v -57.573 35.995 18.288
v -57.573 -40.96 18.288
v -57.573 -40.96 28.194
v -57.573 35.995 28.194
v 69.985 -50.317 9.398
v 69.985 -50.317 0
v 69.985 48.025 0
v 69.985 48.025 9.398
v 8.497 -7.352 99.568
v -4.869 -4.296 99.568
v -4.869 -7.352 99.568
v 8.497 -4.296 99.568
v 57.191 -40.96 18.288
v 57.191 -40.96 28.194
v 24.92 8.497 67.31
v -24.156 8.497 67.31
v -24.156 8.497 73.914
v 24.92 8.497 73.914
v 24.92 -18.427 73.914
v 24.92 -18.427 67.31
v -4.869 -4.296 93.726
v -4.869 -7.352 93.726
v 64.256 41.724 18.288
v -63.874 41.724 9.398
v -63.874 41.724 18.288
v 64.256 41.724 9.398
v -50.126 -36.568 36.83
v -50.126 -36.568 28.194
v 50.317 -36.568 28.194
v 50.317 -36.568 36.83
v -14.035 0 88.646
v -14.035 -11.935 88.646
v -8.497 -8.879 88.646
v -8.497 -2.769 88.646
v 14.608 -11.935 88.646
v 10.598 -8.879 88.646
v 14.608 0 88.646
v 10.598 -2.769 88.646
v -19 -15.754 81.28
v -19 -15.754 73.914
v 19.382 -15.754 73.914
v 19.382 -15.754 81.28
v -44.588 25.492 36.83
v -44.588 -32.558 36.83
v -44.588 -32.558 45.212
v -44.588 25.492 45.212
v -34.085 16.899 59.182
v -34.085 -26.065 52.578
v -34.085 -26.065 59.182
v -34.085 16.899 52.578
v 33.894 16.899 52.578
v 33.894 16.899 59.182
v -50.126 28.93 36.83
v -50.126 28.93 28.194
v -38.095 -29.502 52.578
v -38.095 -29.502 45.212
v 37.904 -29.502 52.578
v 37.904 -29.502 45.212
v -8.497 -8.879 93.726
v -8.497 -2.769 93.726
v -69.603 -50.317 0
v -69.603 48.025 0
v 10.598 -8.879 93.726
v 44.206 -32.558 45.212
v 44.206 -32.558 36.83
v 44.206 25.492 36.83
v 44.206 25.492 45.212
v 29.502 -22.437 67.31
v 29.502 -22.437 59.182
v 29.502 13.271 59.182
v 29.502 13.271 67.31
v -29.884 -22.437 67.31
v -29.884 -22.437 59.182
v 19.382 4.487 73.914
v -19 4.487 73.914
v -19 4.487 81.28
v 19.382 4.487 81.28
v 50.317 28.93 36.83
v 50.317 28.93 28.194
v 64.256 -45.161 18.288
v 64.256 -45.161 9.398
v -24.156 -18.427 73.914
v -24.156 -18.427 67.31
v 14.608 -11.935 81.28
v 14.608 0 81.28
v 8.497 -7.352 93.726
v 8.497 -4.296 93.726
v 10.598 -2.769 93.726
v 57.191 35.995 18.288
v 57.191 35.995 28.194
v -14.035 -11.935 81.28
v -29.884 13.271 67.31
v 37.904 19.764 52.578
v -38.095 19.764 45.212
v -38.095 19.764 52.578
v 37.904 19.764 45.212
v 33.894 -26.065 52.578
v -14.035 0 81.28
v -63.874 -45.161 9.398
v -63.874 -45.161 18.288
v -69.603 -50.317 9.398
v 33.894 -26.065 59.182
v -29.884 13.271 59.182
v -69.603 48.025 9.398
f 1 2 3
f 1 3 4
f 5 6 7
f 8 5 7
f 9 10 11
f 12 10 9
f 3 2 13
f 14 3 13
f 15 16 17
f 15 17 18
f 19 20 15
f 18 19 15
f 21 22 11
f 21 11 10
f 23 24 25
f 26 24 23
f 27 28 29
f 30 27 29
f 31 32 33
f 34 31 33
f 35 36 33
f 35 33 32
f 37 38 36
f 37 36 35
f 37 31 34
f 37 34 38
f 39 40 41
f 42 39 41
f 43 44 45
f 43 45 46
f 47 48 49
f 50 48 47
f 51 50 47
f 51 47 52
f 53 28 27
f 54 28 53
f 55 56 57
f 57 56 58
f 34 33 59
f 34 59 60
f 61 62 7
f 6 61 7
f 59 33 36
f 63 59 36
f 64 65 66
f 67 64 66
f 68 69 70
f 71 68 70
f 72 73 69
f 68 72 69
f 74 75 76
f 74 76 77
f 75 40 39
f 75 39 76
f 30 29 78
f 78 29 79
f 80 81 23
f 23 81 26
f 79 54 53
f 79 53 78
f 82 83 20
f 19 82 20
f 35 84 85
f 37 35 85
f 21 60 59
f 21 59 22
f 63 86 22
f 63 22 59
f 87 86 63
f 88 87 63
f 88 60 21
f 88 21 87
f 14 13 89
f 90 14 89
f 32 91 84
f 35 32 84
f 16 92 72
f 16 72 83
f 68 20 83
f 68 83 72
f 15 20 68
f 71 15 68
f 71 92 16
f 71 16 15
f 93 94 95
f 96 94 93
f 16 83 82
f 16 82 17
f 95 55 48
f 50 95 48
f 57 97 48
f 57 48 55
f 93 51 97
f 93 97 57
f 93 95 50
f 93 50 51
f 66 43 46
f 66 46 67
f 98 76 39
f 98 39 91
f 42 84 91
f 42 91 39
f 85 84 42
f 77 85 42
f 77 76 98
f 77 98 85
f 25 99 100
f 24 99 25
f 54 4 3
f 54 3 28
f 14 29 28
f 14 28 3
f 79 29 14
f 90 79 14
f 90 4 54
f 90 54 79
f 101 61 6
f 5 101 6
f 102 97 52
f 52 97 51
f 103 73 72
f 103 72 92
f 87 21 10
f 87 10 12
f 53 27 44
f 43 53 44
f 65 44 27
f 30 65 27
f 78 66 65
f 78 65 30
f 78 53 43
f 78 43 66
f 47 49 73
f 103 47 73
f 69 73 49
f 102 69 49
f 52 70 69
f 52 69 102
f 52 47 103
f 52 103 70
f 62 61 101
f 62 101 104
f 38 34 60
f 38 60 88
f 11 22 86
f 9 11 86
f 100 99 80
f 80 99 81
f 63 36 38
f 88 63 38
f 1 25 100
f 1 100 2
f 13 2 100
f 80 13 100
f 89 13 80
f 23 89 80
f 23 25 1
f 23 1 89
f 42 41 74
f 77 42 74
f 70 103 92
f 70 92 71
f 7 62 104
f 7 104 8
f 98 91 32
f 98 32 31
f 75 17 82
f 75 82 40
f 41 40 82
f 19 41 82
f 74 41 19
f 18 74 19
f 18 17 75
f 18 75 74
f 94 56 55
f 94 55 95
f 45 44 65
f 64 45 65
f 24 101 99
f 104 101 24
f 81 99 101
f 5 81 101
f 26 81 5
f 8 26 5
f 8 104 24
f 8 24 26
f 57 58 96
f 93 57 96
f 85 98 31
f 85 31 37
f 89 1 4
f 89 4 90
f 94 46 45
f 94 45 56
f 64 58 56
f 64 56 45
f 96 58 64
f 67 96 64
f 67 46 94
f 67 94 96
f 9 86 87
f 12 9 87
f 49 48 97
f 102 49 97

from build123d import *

# Parameters (mm, degrees)
F0_W      = 13.366825413
F0_H      = 3.0552744865
F1_DEPTH  = 99.568
F0_W_2    = 19.0954655409
F0_H_2    = 6.1105492059
F2_DEPTH  = 93.726
F0_W_3    = 28.6431992427
F0_H_3    = 11.9346659631
F3_DEPTH  = 88.646
F0_W_4    = 38.3818857372
F0_H_4    = 20.2411934733
F4_DEPTH  = 81.28
F0_W_5    = 49.0753464401
F0_H_5    = 26.9246064126
F5_DEPTH  = 73.914
F0_W_6    = 59.3868978322
F0_H_6    = 35.7085214928
F6_DEPTH  = 67.31
F0_W_7    = 67.9798536003
F0_H_7    = 42.964797467
F7_DEPTH  = 59.182
F0_W_8    = 75.9999491274
F0_H_8    = 49.2663010955
F8_DEPTH  = 52.578
F0_W_9    = 88.7939184904
F0_H_9    = 58.0502152443
F9_DEPTH  = 45.212
F0_W_10   = 100.4421524704
F0_H_10   = 65.4974486679
F10_DEPTH = 36.83
F0_W_11   = 114.7637441754
F0_H_11   = 76.9547224045
F11_DEPTH = 28.194
F0_W_12   = 128.1305700541
F0_H_12   = 86.884368211
F12_DEPTH = 18.288
F0_W_13   = 139.5878568292
F0_H_13   = 98.3416512609
F13_DEPTH = 9.398


# Not quite as in the source:
# - the program builds the solid bodies; features that only make, move or delete a surface that nothing else refers to are left out


with BuildPart() as f1:
    # F0 (on Top) → F1 (new body)
    with BuildSketch(Plane.XY):
        with Locations((1.8140685279, -5.8241172228)):
            Rectangle(F0_W, F0_H)
    extrude(amount=F1_DEPTH)

    # F0 (on Top) → F2 (join)
    with BuildSketch(Plane.XY):
        with Locations((1.0502506047, -5.8241168736)):
            Rectangle(F0_W_2, F0_H_2)
        with Locations((1.8140685279, -5.8241172228)):
            Rectangle(F0_W, F0_H, mode=Mode.SUBTRACT)
    extrude(amount=F2_DEPTH)

    # F0 (on Top) → F3 (join)
    with BuildSketch(Plane.XY):
        with Locations((0.2864324488, -5.9673329815)):
            Rectangle(F0_W_3, F0_H_3)
        with Locations((1.0502506047, -5.8241168736)):
            Rectangle(F0_W_2, F0_H_2, mode=Mode.SUBTRACT)
    extrude(amount=F3_DEPTH)

    # F0 (on Top) → F4 (join)
    with BuildSketch(Plane.XY):
        with Locations((0.1909546554, -5.6331623346)):
            Rectangle(F0_W_4, F0_H_4)
        with Locations((0.2864324488, -5.9673329815)):
            Rectangle(F0_W_3, F0_H_3, mode=Mode.SUBTRACT)
    extrude(amount=F4_DEPTH)

    # F0 (on Top) → F5 (join)
    with BuildSketch(Plane.XY):
        with Locations((0.3819093108, -4.9648210406)):
            Rectangle(F0_W_5, F0_H_5)
        with Locations((0.1909546554, -5.6331623346)):
            Rectangle(F0_W_4, F0_H_4, mode=Mode.SUBTRACT)
    extrude(amount=F5_DEPTH)

    # F0 (on Top) → F6 (join)
    with BuildSketch(Plane.XY):
        with Locations((-0.1909546554, -4.5829112642)):
            Rectangle(F0_W_6, F0_H_6)
        with Locations((0.3819093108, -4.9648210406)):
            Rectangle(F0_W_5, F0_H_5, mode=Mode.SUBTRACT)
    extrude(amount=F6_DEPTH)

    # F0 (on Top) → F7 (join)
    with BuildSketch(Plane.XY):
        with Locations((-0.0954773277, -4.5829117298)):
            Rectangle(F0_W_7, F0_H_7)
        with Locations((-0.1909546554, -4.5829112642)):
            Rectangle(F0_W_6, F0_H_6, mode=Mode.SUBTRACT)
    extrude(amount=F7_DEPTH)

    # F0 (on Top) → F8 (join)
    with BuildSketch(Plane.XY):
        with Locations((-0.0954773277, -4.8693437129)):
            Rectangle(F0_W_8, F0_H_8)
        with Locations((-0.0954773277, -4.5829117298)):
            Rectangle(F0_W_7, F0_H_7, mode=Mode.SUBTRACT)
    extrude(amount=F8_DEPTH)

    # F0 (on Top) → F9 (join)
    with BuildSketch(Plane.XY):
        with Locations((-0.1909546554, -3.5326592624)):
            Rectangle(F0_W_9, F0_H_9)
        with Locations((-0.0954773277, -4.8693437129)):
            Rectangle(F0_W_8, F0_H_8, mode=Mode.SUBTRACT)
    extrude(amount=F9_DEPTH)

    # F0 (on Top) → F10 (join)
    with BuildSketch(Plane.XY):
        with Locations((0.0954773277, -3.8190940395)):
            Rectangle(F0_W_10, F0_H_10)
        with Locations((-0.1909546554, -3.5326592624)):
            Rectangle(F0_W_9, F0_H_9, mode=Mode.SUBTRACT)
    extrude(amount=F10_DEPTH)

    # F0 (on Top) → F11 (join)
    with BuildSketch(Plane.XY):
        with Locations((-0.1909546554, -2.4824105203)):
            Rectangle(F0_W_11, F0_H_11)
        with Locations((0.0954773277, -3.8190940395)):
            Rectangle(F0_W_10, F0_H_10, mode=Mode.SUBTRACT)
    extrude(amount=F11_DEPTH)

    # F0 (on Top) → F12 (join)
    with BuildSketch(Plane.XY):
        with Locations((0.1909509301, -1.718590036)):
            Rectangle(F0_W_12, F0_H_12)
        with Locations((-0.1909546554, -2.4824105203)):
            Rectangle(F0_W_11, F0_H_11, mode=Mode.SUBTRACT)
    extrude(amount=F12_DEPTH)

    # F0 (on Top) → F13 (join)
    with BuildSketch(Plane.XY):
        with Locations((0.1909546554, -1.1457279325)):
            Rectangle(F0_W_13, F0_H_13)
        with Locations((0.1909509301, -1.718590036)):
            Rectangle(F0_W_12, F0_H_12, mode=Mode.SUBTRACT)
    extrude(amount=F13_DEPTH)


solid = f1.part
